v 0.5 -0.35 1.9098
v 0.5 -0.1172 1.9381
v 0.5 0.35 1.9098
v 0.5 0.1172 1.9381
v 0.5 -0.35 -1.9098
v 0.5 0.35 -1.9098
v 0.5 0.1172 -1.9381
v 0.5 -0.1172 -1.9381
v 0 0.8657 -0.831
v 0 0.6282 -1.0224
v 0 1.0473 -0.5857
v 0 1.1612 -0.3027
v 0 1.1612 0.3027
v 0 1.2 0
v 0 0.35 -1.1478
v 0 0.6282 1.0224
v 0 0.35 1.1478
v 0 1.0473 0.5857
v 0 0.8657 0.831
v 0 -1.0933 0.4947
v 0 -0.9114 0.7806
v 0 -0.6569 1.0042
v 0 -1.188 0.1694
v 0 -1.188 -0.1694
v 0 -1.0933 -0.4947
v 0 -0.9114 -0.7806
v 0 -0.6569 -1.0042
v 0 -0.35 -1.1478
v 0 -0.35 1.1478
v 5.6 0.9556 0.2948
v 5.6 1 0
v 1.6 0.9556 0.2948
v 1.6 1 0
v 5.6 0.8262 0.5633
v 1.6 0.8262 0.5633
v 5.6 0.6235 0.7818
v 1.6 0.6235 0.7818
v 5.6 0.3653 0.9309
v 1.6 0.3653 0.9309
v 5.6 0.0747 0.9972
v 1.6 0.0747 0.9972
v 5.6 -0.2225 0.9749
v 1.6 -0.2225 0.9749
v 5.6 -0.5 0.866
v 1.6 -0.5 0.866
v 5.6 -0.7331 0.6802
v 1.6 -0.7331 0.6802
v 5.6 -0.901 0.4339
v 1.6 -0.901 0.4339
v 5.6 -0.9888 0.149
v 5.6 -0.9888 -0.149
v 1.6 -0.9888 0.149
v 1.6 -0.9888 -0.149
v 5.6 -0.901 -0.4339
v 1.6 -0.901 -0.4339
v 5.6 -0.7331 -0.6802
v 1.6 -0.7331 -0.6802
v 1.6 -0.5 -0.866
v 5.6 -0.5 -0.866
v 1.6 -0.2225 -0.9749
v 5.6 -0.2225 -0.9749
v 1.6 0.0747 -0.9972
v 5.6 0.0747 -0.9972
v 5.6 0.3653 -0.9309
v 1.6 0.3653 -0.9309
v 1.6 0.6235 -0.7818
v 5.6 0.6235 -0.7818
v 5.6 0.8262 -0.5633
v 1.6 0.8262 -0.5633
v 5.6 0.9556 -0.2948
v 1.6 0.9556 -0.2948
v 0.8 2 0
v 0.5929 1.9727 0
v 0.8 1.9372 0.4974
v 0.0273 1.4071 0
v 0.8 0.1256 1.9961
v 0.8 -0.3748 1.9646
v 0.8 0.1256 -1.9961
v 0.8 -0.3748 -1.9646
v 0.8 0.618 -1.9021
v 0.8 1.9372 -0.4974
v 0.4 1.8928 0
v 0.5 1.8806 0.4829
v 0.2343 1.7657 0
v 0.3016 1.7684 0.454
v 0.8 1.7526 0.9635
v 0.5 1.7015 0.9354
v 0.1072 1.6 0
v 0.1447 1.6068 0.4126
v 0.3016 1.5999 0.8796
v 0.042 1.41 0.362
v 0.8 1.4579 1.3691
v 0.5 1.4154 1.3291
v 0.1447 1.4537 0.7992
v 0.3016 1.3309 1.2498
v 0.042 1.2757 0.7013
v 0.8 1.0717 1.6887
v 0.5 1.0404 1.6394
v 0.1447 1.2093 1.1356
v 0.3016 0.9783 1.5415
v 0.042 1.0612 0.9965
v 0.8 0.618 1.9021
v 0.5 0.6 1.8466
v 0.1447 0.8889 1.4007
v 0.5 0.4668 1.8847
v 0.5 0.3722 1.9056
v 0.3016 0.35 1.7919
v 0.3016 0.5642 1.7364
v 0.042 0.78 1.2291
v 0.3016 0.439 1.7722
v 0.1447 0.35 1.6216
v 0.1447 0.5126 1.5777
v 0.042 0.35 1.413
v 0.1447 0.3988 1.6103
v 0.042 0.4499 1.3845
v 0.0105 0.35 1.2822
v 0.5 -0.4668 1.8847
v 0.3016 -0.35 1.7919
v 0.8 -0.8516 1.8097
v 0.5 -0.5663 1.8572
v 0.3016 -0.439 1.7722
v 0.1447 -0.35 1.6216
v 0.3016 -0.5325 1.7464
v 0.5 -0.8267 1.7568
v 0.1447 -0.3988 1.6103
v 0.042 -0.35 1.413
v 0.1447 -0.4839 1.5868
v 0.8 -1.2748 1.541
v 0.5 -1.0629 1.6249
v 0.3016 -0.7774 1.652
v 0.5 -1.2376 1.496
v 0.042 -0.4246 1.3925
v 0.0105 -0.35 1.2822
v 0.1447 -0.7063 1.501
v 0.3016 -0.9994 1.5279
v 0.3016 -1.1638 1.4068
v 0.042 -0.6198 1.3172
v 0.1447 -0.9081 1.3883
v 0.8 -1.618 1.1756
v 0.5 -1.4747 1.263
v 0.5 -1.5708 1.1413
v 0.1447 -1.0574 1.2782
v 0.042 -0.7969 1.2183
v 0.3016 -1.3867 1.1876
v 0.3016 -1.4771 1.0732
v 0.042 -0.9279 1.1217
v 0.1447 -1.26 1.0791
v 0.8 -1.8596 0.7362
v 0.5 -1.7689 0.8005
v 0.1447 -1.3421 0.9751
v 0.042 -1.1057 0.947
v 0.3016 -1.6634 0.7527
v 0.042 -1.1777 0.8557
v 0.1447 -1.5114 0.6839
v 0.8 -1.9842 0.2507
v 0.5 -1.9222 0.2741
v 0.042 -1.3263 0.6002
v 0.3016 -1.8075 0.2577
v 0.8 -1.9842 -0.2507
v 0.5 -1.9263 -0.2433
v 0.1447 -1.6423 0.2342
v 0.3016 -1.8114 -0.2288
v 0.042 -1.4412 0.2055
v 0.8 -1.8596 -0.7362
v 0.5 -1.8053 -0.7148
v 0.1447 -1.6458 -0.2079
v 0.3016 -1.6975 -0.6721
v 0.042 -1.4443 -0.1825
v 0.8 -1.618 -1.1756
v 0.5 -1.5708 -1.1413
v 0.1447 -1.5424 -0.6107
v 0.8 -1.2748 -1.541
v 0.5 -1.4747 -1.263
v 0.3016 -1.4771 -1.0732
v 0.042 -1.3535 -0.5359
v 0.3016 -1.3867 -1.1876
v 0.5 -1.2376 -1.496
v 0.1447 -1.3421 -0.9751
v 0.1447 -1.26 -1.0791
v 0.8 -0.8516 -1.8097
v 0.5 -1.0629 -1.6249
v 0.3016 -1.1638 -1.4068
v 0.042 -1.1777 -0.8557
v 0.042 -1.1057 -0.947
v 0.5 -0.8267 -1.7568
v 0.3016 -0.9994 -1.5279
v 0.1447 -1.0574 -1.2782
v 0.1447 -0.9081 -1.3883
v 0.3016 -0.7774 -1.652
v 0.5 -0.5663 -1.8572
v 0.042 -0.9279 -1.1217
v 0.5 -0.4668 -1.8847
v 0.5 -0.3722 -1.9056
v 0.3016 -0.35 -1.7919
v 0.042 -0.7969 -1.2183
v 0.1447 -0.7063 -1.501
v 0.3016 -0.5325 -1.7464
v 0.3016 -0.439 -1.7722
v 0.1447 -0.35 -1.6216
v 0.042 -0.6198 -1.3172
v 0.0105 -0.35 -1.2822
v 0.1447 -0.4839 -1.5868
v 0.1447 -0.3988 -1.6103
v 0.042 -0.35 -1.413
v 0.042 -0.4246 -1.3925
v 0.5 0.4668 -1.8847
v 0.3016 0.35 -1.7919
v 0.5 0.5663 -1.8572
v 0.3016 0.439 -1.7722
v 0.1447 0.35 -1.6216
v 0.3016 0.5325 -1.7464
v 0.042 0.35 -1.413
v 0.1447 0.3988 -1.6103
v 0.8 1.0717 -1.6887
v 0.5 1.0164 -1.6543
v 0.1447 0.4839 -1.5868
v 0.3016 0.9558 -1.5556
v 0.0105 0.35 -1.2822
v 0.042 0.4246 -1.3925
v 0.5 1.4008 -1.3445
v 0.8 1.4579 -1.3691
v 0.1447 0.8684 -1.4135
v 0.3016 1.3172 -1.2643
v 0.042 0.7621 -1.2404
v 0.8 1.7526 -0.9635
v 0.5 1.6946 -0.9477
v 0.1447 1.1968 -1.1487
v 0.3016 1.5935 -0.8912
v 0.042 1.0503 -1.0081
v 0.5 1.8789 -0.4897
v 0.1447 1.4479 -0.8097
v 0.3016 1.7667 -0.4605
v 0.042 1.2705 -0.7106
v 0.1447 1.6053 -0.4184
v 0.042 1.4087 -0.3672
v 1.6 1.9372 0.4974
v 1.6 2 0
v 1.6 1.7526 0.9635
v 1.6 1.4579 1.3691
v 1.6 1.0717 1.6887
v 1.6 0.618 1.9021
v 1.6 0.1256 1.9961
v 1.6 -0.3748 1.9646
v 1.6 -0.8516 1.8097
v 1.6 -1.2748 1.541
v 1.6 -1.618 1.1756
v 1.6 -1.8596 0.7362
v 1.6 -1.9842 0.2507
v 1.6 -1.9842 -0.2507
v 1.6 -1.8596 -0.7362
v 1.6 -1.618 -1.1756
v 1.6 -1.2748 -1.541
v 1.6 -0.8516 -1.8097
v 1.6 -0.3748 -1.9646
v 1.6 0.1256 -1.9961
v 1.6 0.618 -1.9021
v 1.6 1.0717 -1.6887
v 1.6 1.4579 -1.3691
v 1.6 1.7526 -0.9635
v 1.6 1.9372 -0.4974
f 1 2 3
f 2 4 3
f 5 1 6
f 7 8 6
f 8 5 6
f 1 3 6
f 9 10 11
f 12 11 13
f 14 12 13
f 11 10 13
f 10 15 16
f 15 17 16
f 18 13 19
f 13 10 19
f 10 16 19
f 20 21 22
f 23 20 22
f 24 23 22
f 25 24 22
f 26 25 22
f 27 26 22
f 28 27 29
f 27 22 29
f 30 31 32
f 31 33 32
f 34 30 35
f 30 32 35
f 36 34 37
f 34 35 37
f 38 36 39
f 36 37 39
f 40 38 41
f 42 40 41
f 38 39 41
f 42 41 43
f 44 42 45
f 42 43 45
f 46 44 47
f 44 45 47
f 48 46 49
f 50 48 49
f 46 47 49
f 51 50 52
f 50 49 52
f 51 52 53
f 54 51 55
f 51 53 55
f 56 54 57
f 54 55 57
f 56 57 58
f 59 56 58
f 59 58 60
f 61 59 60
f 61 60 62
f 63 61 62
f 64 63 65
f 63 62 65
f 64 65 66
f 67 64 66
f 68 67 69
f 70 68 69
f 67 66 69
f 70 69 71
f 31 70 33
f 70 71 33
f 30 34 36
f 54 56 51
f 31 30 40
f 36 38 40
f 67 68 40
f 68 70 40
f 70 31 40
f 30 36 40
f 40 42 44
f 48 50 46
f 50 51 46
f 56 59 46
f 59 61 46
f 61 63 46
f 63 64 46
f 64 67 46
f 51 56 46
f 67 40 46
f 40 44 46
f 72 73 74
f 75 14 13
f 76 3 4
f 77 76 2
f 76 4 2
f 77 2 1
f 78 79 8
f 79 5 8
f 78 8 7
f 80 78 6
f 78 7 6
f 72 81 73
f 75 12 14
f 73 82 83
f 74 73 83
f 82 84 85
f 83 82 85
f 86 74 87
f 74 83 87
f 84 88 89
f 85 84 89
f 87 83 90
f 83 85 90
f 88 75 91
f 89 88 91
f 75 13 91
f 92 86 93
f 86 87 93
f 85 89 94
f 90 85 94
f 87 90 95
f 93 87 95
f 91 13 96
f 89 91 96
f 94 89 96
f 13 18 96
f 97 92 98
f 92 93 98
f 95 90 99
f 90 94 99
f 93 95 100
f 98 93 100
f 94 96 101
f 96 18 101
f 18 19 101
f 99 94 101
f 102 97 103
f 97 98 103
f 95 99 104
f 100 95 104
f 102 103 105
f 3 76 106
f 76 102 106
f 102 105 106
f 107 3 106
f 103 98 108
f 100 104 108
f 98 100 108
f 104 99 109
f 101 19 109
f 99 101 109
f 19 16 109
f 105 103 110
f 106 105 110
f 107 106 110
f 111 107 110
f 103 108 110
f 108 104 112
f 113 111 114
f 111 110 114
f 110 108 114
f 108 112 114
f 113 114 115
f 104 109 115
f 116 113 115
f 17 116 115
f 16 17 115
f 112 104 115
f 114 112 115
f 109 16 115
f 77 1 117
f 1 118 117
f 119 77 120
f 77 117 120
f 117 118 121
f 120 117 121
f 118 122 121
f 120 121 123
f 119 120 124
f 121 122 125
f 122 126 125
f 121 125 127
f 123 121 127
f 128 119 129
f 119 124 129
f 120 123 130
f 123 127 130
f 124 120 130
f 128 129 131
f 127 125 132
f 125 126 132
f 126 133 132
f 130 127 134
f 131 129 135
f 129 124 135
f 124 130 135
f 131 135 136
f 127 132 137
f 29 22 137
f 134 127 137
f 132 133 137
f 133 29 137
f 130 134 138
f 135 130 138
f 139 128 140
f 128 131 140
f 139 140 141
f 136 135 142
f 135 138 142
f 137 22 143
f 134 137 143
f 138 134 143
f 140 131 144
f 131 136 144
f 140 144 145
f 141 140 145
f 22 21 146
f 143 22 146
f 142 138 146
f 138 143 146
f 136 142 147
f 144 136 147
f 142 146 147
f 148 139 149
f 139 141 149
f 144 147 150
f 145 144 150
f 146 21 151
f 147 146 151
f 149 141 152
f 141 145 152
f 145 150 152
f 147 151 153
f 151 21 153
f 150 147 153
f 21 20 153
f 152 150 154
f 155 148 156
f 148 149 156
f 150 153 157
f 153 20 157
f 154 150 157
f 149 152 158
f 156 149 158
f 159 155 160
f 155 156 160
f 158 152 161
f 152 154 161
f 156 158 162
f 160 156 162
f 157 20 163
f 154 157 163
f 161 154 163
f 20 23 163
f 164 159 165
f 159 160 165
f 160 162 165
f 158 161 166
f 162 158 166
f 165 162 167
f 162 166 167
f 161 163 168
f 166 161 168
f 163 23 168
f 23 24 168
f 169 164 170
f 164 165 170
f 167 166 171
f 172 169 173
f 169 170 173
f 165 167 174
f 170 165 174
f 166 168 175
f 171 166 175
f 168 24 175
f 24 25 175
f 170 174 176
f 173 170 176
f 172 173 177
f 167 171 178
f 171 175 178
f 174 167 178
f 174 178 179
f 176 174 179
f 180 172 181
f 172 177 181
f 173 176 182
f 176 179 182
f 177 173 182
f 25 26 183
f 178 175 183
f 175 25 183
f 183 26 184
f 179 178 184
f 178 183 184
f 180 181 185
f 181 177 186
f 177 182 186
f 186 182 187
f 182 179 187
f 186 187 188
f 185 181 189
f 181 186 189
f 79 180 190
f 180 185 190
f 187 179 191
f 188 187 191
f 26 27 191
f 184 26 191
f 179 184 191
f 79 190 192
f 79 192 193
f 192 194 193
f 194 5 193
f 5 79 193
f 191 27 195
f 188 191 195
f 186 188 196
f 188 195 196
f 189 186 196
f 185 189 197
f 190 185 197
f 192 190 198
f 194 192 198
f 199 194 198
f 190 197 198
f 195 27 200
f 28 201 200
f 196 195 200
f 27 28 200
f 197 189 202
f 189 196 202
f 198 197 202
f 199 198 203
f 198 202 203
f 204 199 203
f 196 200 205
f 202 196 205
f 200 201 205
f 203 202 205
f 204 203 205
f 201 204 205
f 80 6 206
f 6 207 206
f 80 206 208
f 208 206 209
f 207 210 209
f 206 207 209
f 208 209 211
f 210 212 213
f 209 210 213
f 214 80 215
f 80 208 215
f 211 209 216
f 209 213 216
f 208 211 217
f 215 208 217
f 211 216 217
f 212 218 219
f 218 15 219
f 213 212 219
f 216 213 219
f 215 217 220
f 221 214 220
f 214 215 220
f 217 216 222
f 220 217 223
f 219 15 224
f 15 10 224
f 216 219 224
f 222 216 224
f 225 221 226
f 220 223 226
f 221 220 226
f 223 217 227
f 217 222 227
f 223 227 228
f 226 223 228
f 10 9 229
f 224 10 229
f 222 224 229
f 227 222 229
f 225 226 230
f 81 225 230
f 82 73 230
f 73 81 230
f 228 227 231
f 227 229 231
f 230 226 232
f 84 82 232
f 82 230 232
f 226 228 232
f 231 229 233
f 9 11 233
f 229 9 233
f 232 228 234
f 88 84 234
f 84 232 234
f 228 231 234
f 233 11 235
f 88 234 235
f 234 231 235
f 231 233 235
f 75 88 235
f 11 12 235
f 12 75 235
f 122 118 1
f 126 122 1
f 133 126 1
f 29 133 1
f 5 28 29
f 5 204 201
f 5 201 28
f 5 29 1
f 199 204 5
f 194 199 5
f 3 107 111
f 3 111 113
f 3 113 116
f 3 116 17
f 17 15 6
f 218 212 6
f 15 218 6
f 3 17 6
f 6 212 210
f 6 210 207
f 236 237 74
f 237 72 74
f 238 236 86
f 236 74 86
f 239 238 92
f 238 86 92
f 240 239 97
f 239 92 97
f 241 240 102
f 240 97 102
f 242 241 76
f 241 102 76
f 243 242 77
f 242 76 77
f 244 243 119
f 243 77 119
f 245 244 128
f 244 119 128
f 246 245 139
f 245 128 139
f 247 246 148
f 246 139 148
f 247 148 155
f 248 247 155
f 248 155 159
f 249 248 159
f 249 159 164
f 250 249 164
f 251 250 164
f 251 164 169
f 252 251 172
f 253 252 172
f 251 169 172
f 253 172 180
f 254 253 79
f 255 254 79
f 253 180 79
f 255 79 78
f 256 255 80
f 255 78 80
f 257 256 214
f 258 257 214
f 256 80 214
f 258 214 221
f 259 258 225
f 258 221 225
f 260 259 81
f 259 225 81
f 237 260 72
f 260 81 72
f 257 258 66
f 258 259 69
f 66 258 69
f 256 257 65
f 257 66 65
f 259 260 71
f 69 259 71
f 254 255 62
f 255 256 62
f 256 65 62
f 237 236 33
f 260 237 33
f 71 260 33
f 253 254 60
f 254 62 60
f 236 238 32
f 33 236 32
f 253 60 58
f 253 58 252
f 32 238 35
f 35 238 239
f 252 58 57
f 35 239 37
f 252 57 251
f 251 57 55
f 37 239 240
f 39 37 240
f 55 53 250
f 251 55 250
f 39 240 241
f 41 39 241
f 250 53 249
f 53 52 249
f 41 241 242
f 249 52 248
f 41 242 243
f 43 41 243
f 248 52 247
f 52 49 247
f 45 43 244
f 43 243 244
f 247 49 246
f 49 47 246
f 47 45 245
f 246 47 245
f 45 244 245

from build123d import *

# Parameters (mm, degrees)
SKETCH2_W  = 4
SKETCH2_H  = 0.7
SLOT_DEPTH = 0.5


with BuildPart() as part:
    # BodySke → Base-Revolve (revolve)
    with BuildSketch(Plane.XY):
        with BuildLine():
            Line((1.6, 1), (1.6, 2))
            Line((1.6, 2), (0.8, 2))
            ThreePointArc((0.8, 2), (0.234314575, 1.765685425), (0, 1.2))
            Line((0, 1.2), (0, 0))
            Line((0, 0), (5.6, 0))
            Line((5.6, 0), (5.6, 1))
            Line((5.6, 1), (1.6, 1))
        make_face()
    revolve(axis=Axis((-25.4, 0, 0), (1, 0, 0)))

    # Sketch2 → Slot (cut)
    with BuildSketch(Plane(origin=(0, 0, 0), x_dir=(0, 0, -1), z_dir=(1, 0, 0))):
        Rectangle(SKETCH2_W, SKETCH2_H)
    extrude(amount=SLOT_DEPTH, mode=Mode.SUBTRACT)


solid = part.part
